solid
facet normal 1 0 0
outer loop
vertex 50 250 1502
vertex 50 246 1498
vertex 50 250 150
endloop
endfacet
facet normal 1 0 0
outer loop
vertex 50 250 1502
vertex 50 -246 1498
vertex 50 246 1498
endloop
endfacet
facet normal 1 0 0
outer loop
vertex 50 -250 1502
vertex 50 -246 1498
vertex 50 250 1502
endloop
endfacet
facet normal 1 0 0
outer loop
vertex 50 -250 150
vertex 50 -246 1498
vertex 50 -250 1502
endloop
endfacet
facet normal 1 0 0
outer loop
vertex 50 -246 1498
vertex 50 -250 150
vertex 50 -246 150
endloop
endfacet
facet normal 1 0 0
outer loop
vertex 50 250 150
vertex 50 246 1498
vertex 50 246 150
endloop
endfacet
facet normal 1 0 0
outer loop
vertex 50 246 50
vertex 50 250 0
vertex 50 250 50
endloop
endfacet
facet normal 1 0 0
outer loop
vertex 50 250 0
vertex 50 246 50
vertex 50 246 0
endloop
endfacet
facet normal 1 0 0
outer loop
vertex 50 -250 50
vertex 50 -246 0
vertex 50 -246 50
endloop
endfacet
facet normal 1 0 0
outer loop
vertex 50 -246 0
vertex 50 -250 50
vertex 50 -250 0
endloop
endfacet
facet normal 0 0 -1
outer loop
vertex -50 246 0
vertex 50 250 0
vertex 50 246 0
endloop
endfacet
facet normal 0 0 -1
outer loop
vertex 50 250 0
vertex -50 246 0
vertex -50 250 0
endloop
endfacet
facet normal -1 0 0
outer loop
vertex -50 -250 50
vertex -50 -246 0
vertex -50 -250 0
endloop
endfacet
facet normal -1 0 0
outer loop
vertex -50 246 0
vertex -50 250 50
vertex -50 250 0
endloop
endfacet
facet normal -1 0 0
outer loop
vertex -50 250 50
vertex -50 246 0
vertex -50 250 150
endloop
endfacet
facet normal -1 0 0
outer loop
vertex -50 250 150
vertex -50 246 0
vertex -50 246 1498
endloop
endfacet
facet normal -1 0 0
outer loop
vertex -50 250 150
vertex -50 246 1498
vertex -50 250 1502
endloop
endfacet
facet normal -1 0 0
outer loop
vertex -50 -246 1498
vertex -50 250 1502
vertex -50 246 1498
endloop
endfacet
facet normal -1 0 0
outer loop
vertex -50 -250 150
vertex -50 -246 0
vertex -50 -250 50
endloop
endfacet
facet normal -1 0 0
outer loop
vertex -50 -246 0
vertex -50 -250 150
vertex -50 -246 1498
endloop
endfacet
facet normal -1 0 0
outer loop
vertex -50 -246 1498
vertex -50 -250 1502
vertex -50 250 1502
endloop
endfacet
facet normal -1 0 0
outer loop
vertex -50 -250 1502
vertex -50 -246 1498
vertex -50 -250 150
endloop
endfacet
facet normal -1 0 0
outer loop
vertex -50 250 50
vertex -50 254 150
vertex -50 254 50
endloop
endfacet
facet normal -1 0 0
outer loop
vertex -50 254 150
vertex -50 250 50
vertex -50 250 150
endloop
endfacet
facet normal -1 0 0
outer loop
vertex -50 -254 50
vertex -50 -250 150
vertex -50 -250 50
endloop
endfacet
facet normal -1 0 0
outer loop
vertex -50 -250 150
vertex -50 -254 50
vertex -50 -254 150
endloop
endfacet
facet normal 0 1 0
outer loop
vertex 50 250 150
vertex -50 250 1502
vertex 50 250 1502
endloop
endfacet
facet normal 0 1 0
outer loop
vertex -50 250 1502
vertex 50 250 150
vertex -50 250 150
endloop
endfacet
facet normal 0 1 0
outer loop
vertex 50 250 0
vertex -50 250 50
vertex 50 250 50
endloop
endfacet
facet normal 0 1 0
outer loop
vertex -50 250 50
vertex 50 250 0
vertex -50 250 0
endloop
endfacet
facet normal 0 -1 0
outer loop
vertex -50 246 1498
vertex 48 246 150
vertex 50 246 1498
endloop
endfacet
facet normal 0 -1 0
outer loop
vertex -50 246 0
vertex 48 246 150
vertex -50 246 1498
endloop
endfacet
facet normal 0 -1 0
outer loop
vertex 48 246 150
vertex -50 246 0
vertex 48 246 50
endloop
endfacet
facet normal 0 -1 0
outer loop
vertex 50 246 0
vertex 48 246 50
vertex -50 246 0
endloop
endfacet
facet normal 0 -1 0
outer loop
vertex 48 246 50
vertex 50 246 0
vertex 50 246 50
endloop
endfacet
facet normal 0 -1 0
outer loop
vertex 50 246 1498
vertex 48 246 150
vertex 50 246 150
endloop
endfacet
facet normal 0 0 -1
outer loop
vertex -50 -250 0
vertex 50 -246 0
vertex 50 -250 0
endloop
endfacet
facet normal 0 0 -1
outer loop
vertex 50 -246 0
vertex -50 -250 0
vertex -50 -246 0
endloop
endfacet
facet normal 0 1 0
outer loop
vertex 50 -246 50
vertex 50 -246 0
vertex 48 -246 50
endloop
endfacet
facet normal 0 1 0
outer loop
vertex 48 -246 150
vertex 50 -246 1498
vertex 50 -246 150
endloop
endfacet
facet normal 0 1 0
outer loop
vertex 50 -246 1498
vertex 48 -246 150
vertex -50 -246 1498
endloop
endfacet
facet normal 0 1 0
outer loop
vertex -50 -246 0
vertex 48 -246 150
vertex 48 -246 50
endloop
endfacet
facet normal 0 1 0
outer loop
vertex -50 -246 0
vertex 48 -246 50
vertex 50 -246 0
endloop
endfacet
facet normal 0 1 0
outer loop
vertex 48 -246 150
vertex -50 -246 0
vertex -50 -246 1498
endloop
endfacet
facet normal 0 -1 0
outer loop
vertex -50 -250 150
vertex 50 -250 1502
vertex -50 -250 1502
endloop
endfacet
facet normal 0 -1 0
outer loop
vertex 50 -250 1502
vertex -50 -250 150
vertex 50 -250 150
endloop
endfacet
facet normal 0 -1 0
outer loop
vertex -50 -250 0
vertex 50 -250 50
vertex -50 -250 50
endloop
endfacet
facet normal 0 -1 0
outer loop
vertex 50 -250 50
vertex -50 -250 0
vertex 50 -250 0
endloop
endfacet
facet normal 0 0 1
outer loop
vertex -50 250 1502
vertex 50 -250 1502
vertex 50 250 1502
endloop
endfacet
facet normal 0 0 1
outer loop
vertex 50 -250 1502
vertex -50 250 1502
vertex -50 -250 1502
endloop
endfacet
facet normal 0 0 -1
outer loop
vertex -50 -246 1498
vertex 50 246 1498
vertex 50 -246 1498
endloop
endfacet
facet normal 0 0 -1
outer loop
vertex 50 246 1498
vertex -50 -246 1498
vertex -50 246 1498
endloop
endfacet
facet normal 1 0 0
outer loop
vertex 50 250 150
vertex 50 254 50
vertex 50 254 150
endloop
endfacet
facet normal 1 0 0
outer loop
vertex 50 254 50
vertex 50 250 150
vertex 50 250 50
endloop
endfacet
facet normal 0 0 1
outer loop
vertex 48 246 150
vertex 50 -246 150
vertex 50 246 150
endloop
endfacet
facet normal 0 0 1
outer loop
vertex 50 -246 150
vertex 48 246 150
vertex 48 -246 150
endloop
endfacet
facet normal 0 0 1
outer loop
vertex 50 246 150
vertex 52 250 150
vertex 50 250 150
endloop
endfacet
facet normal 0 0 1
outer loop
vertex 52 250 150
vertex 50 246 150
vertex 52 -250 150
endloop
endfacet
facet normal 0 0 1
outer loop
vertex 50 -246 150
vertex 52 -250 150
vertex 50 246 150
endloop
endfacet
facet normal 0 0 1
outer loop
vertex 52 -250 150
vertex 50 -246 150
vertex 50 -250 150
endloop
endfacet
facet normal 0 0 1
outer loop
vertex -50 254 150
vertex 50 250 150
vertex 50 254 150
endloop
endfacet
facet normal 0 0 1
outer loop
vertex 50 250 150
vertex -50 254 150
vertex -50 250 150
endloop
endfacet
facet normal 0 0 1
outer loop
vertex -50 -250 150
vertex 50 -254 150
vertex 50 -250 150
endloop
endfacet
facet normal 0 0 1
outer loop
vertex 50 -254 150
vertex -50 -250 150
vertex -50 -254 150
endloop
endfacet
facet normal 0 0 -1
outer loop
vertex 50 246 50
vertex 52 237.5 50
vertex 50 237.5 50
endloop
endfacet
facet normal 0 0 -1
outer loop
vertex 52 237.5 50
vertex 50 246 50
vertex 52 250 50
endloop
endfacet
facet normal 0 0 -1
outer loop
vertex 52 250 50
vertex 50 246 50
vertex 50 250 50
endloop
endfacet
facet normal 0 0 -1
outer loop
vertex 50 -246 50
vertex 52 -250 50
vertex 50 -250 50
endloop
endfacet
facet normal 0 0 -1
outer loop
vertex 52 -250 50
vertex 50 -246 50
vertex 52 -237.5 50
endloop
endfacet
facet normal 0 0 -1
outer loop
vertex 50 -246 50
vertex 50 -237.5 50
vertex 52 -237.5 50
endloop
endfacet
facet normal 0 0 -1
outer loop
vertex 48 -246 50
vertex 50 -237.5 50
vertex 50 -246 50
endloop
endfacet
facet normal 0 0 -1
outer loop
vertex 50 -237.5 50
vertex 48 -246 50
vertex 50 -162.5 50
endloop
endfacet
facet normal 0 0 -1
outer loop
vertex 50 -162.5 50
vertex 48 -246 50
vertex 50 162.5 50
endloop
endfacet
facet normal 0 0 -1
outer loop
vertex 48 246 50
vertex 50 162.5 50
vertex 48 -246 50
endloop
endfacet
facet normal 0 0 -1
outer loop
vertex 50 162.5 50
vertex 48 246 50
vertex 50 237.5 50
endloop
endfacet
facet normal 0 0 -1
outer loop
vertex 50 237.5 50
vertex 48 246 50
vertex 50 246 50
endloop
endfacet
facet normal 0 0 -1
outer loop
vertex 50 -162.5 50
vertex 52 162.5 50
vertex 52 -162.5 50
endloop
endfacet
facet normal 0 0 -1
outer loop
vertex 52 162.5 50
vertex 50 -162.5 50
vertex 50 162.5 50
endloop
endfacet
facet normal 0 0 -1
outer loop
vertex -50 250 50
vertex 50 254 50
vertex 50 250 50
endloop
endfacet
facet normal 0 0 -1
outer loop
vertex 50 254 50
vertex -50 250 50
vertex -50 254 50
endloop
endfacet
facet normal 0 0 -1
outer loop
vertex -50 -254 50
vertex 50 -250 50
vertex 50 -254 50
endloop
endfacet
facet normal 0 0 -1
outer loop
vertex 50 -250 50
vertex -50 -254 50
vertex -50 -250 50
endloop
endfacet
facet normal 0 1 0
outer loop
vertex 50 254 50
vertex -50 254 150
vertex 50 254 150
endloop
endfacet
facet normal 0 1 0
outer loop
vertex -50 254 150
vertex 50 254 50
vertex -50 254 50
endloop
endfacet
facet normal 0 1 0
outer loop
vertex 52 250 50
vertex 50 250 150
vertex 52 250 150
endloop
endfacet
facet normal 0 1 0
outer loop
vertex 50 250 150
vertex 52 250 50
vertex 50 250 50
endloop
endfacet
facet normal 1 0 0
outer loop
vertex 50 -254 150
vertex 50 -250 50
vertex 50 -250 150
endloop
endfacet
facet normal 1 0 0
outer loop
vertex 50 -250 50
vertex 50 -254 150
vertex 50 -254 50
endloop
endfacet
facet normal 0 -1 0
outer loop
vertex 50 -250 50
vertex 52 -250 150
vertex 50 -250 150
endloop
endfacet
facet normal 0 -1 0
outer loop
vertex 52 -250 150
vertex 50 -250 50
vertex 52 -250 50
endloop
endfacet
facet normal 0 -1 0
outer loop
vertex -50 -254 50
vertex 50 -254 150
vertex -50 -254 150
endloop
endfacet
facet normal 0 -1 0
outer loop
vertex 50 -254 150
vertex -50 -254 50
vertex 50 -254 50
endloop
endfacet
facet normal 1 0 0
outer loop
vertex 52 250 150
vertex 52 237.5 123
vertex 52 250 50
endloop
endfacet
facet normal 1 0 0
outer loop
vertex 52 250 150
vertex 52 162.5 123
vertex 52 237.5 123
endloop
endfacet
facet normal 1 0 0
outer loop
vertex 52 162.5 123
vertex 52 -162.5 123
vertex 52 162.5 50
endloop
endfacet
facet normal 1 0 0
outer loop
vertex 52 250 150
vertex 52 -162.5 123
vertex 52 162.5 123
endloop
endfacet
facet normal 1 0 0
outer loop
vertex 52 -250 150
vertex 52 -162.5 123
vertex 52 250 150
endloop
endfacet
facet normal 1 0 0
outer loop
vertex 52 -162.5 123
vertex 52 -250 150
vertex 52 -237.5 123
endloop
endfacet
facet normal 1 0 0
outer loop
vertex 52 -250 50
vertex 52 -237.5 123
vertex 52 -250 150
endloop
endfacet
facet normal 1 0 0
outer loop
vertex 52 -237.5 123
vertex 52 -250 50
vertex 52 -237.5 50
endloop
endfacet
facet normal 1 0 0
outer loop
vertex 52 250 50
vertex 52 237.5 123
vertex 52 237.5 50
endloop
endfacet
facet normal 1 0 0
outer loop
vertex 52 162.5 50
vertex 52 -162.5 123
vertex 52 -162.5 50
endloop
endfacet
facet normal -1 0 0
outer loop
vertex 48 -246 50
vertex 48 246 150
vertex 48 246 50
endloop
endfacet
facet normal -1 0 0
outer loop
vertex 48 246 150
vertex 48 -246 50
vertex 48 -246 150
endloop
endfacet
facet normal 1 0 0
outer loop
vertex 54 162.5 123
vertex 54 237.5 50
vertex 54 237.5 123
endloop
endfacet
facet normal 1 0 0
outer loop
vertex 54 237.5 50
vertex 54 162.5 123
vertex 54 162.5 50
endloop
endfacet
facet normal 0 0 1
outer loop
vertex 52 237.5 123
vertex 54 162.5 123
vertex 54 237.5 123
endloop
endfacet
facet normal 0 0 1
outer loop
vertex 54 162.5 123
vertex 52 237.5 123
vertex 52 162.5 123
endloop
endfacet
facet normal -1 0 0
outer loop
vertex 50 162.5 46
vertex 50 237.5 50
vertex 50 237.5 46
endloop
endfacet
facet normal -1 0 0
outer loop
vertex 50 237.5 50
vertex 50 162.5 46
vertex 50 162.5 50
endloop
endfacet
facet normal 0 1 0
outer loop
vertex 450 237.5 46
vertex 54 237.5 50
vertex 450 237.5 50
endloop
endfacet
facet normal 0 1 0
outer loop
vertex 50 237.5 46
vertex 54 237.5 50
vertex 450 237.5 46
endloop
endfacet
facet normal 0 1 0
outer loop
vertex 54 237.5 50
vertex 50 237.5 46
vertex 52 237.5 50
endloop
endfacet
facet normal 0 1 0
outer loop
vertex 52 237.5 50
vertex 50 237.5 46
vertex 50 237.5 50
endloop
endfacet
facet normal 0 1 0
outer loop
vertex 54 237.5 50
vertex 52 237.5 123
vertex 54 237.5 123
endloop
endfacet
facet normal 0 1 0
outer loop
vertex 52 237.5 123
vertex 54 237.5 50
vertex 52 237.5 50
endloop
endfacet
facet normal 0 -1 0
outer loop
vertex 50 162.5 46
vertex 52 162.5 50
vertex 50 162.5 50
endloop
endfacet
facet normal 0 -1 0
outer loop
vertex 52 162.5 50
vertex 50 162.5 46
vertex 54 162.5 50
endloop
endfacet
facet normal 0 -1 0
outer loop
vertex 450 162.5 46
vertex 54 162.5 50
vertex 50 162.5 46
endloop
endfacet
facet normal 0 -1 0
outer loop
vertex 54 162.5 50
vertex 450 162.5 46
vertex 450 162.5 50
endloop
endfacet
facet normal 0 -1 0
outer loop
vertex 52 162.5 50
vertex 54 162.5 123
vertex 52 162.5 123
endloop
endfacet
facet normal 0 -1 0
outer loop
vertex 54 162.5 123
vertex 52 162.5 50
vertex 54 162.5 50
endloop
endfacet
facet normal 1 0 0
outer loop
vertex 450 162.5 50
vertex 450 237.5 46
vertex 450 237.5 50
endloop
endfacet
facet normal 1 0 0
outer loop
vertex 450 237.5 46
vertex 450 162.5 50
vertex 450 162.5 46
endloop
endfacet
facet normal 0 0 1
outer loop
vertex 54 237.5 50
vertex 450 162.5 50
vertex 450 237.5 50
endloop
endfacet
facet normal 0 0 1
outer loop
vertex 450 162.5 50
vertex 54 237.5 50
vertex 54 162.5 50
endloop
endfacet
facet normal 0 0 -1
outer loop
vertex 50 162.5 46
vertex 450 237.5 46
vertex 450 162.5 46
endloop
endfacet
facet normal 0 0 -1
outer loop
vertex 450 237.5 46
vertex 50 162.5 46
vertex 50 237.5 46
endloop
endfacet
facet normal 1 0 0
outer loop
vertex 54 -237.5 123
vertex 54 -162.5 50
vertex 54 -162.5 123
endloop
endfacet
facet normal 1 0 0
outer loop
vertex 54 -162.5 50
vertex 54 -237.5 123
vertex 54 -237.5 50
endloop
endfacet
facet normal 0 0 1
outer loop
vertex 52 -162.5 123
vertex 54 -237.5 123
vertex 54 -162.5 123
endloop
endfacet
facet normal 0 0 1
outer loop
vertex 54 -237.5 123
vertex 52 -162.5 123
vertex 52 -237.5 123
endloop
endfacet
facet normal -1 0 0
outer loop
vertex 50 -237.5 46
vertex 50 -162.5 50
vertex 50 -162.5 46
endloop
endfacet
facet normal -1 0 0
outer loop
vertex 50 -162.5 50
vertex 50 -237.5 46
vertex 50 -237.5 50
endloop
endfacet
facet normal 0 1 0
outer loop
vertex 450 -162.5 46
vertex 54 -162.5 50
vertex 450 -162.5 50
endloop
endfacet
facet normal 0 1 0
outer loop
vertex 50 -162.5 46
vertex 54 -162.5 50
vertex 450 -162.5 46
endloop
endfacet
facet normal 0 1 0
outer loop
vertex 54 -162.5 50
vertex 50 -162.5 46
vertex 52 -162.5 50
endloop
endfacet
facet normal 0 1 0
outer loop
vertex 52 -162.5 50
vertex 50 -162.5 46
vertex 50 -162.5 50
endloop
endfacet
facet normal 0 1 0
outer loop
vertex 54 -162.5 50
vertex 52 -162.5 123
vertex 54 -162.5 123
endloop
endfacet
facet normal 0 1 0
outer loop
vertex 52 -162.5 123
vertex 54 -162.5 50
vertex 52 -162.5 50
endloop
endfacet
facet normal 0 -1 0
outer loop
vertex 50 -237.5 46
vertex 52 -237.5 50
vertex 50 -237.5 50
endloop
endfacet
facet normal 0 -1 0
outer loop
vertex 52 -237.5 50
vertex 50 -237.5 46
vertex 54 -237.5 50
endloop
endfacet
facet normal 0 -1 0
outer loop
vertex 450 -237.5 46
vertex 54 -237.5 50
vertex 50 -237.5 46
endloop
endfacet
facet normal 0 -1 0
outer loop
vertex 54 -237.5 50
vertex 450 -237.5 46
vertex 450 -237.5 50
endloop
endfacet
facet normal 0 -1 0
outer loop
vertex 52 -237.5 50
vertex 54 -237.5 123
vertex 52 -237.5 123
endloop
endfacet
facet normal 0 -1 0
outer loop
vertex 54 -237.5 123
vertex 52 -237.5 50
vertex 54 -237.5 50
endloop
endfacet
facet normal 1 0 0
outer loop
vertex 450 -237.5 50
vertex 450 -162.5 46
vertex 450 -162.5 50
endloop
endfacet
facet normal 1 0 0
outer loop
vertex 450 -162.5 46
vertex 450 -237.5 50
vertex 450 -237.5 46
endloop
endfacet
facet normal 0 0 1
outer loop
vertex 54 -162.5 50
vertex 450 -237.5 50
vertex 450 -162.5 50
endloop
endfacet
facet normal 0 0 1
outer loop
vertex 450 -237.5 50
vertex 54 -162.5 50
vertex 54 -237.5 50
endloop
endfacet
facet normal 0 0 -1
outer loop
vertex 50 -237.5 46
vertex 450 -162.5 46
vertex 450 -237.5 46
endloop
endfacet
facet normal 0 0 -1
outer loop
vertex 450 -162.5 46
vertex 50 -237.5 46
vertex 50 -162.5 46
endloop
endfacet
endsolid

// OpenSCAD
module Portico(width=500, height=1500, thickness=2, side=100){
    for (y=[1, -1]) {
        translate([0, y*(width/2-thickness/2), height/2])
        cube([side, thickness, height], center=true);
    }
    
    translate([0, 0, height])
    cube([side, width, thickness], center=true);
}

module Horquilla(width=500, side=100, thickness=2){
    translate([side/2, 0, 0])
    cube([thickness, width, side], center=true);
    
    for (y=[1, -1]) {
        translate([0, y*(width/2+thickness/2), 0])
        cube([side, thickness, side], center=true);
    }
}

module Unna(length=400, side=75, thickness=2){
    translate([0, 0, -thickness/2]){
        translate([thickness/2, 0, side/2])
        cube([thickness, side, side], center=true);
        
        translate([length/2, 0, 0])
        cube([length, side, thickness], center=true);
    }
}

module Autoelevador(width=500, height=1500, length=400, thickness=4, side=100, unna_side=75, joint_z=sin($t*180)^2, joint_y=cos($t*180)^2, joint_z_lims=[100, 1400], joint_z_0 = 0.2){
    
    color([.9,.5,.5])
    Portico(width=width, height=height, thickness=thickness, side=side);

    translate([0, 0, joint_z_lims[0]+(joint_z_lims[1]-joint_z_lims[0])*joint_z]){
        color([0.3, 0.5, 0.3])
        Horquilla(width=width, side=side, thickness=thickness);

        for (y=[1, -1]){
            translate([50, y*(side/2 + joint_y*(width-2*side)/2),-side/2])
            color([0.5, 0.5, 0.9])
            Unna(length=length, side=unna_side, thickness=thickness);
        }
    }
}

Autoelevador();
